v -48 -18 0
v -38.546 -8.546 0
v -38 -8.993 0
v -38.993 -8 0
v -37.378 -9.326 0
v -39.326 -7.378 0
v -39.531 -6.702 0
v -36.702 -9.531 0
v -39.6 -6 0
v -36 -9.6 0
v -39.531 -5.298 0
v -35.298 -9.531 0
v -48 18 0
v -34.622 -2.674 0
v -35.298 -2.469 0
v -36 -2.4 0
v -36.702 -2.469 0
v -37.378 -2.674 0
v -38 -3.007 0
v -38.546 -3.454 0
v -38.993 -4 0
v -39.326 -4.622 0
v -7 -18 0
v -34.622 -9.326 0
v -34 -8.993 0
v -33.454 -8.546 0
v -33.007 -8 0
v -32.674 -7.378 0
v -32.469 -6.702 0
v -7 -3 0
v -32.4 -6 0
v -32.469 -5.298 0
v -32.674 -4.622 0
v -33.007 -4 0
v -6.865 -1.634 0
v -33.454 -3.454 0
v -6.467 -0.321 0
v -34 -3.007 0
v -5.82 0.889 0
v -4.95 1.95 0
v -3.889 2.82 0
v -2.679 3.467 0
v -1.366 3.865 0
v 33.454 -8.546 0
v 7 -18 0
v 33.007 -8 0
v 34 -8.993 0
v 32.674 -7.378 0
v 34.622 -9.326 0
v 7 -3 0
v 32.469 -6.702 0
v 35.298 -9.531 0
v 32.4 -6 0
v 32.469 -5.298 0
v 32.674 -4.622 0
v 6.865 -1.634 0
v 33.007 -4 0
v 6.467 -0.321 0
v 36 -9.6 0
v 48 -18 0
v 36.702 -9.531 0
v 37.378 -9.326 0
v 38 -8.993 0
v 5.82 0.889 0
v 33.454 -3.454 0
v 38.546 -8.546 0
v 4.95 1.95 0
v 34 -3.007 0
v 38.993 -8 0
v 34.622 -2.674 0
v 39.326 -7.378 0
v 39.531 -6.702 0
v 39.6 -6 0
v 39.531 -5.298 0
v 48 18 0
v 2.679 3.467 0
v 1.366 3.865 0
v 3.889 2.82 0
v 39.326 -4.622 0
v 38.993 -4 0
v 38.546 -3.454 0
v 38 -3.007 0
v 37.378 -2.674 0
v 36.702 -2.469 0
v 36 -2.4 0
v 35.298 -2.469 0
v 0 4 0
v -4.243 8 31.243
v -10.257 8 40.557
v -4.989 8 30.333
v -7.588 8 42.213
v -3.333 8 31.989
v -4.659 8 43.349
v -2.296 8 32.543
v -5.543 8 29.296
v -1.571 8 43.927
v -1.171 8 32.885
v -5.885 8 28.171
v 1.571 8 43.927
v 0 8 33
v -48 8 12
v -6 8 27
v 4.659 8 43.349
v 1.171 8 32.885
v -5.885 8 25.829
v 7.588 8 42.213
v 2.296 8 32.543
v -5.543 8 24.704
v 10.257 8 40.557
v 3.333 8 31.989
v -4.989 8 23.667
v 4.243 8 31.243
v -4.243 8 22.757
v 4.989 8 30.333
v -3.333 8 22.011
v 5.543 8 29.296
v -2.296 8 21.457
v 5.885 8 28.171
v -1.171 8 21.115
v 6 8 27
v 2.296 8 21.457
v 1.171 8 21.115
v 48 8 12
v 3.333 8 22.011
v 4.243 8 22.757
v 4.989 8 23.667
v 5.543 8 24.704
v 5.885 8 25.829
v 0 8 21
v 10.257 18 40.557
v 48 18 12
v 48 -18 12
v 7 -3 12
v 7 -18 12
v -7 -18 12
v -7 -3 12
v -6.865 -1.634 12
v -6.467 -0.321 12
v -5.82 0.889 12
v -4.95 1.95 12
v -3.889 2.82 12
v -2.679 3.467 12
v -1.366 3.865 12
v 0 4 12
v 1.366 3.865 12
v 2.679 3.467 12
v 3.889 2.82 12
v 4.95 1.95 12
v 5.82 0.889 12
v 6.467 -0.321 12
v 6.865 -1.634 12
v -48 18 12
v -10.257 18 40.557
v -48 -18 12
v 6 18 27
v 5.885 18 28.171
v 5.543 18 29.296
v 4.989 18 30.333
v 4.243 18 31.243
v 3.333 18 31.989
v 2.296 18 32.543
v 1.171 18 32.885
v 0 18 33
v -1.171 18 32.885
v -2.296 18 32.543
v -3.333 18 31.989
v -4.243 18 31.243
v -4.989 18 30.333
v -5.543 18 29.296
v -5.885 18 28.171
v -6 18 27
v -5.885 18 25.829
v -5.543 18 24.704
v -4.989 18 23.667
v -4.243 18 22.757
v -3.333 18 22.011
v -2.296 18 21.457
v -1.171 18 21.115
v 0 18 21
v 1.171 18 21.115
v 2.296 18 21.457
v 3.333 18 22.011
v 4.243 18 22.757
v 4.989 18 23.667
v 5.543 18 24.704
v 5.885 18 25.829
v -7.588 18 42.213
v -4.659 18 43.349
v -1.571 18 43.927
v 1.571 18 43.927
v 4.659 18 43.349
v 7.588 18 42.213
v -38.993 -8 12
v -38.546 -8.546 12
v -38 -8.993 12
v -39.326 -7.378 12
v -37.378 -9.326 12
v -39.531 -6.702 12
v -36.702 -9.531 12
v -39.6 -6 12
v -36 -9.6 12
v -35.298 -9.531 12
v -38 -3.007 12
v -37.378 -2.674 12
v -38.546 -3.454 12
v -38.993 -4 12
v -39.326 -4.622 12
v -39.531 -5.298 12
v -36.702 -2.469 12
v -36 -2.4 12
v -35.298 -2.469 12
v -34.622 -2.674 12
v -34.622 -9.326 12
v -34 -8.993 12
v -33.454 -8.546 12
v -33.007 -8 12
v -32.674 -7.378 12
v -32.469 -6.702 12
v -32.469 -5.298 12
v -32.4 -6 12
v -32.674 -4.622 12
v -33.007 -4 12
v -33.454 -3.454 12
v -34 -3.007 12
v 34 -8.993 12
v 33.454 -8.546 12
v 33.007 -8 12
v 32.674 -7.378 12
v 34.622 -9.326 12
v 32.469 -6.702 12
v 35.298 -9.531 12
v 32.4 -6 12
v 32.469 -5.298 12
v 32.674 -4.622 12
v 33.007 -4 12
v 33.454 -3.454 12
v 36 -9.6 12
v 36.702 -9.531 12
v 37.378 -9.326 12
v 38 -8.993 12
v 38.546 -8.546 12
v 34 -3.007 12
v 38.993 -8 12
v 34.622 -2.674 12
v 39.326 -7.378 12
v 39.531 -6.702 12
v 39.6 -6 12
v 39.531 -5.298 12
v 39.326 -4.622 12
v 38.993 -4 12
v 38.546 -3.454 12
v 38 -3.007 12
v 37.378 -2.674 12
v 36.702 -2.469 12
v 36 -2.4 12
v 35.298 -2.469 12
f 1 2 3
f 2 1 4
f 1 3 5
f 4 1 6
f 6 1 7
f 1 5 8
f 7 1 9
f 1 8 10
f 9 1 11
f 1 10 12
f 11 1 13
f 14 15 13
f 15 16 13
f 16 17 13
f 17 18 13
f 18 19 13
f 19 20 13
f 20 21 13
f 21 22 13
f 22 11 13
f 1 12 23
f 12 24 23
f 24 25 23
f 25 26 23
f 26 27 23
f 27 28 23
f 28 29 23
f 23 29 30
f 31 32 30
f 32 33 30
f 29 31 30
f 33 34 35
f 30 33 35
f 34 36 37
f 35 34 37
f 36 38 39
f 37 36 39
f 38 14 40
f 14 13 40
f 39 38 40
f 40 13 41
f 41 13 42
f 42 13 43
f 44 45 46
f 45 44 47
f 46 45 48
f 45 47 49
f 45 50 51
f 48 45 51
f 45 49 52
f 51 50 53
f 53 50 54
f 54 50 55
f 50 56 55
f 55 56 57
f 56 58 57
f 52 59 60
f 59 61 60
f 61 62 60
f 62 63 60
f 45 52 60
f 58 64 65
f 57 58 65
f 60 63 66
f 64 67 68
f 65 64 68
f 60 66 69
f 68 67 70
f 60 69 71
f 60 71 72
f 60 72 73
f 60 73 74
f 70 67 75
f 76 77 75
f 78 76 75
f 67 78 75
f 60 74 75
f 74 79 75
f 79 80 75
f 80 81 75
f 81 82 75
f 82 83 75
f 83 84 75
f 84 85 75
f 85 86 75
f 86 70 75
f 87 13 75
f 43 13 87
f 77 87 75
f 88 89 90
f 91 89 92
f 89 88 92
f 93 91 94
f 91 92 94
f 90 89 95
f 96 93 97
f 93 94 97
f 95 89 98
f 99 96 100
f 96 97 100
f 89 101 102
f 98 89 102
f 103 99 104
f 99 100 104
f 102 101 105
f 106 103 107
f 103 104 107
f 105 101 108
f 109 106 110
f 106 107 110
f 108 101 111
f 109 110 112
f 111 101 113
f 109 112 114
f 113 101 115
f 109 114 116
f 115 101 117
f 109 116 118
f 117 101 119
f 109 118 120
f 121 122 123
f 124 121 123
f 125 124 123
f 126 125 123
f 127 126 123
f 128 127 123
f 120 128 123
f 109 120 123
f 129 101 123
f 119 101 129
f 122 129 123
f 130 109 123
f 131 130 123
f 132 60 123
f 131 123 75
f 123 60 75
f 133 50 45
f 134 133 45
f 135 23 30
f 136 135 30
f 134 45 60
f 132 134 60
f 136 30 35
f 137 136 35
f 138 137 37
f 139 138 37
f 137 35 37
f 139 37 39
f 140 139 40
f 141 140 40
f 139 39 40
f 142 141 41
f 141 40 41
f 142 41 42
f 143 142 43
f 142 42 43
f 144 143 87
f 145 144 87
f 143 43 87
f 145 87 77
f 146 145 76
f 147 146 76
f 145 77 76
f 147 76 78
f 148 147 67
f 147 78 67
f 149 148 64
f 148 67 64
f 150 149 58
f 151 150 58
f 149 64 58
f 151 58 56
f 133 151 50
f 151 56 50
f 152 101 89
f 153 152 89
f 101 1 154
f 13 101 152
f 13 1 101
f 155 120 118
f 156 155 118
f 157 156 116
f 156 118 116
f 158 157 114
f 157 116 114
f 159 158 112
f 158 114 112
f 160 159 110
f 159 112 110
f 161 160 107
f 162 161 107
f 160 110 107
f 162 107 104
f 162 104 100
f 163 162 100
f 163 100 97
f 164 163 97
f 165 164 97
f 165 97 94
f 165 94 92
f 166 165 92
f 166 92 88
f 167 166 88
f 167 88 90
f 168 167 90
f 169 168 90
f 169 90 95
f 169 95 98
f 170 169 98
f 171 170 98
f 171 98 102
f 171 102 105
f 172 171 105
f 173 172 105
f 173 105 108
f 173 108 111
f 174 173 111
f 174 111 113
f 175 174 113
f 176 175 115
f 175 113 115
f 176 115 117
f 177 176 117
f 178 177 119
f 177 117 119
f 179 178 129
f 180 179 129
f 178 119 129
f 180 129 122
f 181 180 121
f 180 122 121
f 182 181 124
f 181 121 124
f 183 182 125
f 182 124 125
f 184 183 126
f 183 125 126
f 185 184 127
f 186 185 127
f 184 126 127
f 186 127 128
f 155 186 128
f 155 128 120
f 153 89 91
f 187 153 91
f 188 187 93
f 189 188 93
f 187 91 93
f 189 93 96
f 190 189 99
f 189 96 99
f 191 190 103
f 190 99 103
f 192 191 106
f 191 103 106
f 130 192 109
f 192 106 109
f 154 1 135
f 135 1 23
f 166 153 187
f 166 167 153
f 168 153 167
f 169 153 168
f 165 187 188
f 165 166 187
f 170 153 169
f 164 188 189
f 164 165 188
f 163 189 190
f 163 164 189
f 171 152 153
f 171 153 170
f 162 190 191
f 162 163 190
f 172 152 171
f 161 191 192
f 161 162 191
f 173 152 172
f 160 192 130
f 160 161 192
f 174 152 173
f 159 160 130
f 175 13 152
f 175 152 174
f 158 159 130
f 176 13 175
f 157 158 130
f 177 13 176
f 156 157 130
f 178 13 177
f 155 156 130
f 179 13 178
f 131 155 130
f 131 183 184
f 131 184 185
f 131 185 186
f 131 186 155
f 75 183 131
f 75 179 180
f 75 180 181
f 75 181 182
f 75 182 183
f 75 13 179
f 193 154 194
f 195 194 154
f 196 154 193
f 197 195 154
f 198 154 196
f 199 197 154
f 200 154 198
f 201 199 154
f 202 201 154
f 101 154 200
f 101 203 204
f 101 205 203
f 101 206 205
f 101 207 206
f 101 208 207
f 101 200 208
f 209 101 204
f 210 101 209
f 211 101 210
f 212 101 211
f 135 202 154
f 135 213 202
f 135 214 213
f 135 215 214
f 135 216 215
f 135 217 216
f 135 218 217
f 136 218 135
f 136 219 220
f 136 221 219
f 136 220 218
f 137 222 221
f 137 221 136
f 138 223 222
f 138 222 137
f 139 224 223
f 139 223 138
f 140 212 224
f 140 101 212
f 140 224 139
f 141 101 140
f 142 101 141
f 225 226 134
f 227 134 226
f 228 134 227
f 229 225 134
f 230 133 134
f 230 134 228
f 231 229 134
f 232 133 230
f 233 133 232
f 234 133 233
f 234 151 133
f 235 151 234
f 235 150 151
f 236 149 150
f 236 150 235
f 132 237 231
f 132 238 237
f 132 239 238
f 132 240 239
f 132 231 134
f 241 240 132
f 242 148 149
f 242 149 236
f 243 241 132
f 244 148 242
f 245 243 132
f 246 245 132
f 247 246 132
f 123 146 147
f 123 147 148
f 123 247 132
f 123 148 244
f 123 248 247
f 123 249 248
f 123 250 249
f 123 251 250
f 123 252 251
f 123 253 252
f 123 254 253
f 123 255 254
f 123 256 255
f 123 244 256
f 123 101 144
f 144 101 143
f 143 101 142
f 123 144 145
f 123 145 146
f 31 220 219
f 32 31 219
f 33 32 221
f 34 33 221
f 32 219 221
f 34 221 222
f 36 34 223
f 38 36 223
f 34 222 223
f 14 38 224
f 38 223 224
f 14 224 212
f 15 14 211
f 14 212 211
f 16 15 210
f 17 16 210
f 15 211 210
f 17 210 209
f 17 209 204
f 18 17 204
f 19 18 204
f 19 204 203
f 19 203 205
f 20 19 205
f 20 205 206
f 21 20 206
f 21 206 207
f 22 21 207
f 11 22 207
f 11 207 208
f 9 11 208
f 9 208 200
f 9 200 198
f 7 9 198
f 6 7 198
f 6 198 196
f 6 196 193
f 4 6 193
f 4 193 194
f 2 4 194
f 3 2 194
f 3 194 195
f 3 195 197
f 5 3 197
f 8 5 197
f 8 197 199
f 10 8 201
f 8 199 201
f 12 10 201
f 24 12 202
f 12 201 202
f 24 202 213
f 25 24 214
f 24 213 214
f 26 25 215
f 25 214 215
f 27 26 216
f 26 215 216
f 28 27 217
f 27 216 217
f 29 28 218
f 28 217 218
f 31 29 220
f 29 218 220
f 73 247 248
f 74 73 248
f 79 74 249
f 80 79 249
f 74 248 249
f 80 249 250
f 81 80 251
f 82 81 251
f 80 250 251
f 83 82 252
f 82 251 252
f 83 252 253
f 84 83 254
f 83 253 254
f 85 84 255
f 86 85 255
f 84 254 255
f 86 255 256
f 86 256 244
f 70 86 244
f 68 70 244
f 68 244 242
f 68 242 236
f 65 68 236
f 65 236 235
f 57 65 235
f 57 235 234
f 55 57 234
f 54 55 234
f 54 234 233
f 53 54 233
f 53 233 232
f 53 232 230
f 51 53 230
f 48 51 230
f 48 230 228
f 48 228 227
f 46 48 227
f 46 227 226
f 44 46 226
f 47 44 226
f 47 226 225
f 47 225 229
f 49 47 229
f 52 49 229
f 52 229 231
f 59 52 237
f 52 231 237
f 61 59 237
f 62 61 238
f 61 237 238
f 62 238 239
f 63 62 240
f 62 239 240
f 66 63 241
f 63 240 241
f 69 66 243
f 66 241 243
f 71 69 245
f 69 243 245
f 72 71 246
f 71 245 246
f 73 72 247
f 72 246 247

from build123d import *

# Parameters (mm, degrees)
F1_DEPTH = 12
F2_R     = 3.6
F3_DEPTH = 12.001
F4_W     = 96
F4_H     = 10
F5_DEPTH = 32
F6_R     = 6
F7_DEPTH = 10.001
F9_DEPTH = 25


with BuildPart() as f1:
    # F0 (on Top) → F1 (new body)
    with BuildSketch(Plane.XY):
        with BuildLine():
            Line((7, -18), (48, -18))
            Line((48, -18), (48, 18))
            Line((48, 18), (-48, 18))
            Line((-48, 18), (-48, -18))
            Line((-48, -18), (-7, -18))
            Line((-7, -18), (-7, -3))
            ThreePointArc((-7, -3), (0, 4), (7, -3))
            Line((7, -3), (7, -18))
        make_face()
    extrude(amount=F1_DEPTH)

    # F2 (on face) → F3 (cut, through all)
    with BuildSketch(Plane.XY.offset(12)):
        with Locations((36, -6)):
            Circle(F2_R)
        with Locations((-36, -6)):
            Circle(F2_R)
    extrude(amount=-F3_DEPTH, mode=Mode.SUBTRACT)

    # F4 (on face) → F5 (join)
    with BuildSketch(Plane.XY.offset(12)):
        with Locations((0, 13)):
            Rectangle(F4_W, F4_H)
    extrude(amount=F5_DEPTH)

    # F6 (on face) → F7 (cut, through all)
    with BuildSketch(Plane.XZ.offset(-8)):
        with Locations((0, 27)):
            Circle(F6_R)
    extrude(amount=-F7_DEPTH, mode=Mode.SUBTRACT)

    # F8 (on face) → F9 (cut)
    with BuildSketch(Plane.XZ.offset(-8)):
        with BuildLine():
            ThreePointArc((-10.257336, 40.556809), (0, 44), (10.257336, 40.556809))
            Line((10.257336, 40.556809), (48, 12))
            Line((48, 12), (48, 44.921719))
            Line((48, 44.921719), (-48, 44.921719))
            Line((-48, 44.921719), (-48, 12))
            Line((-48, 12), (-10.257336, 40.556809))
        make_face()
    extrude(amount=-F9_DEPTH, mode=Mode.SUBTRACT)


solid = f1.part
